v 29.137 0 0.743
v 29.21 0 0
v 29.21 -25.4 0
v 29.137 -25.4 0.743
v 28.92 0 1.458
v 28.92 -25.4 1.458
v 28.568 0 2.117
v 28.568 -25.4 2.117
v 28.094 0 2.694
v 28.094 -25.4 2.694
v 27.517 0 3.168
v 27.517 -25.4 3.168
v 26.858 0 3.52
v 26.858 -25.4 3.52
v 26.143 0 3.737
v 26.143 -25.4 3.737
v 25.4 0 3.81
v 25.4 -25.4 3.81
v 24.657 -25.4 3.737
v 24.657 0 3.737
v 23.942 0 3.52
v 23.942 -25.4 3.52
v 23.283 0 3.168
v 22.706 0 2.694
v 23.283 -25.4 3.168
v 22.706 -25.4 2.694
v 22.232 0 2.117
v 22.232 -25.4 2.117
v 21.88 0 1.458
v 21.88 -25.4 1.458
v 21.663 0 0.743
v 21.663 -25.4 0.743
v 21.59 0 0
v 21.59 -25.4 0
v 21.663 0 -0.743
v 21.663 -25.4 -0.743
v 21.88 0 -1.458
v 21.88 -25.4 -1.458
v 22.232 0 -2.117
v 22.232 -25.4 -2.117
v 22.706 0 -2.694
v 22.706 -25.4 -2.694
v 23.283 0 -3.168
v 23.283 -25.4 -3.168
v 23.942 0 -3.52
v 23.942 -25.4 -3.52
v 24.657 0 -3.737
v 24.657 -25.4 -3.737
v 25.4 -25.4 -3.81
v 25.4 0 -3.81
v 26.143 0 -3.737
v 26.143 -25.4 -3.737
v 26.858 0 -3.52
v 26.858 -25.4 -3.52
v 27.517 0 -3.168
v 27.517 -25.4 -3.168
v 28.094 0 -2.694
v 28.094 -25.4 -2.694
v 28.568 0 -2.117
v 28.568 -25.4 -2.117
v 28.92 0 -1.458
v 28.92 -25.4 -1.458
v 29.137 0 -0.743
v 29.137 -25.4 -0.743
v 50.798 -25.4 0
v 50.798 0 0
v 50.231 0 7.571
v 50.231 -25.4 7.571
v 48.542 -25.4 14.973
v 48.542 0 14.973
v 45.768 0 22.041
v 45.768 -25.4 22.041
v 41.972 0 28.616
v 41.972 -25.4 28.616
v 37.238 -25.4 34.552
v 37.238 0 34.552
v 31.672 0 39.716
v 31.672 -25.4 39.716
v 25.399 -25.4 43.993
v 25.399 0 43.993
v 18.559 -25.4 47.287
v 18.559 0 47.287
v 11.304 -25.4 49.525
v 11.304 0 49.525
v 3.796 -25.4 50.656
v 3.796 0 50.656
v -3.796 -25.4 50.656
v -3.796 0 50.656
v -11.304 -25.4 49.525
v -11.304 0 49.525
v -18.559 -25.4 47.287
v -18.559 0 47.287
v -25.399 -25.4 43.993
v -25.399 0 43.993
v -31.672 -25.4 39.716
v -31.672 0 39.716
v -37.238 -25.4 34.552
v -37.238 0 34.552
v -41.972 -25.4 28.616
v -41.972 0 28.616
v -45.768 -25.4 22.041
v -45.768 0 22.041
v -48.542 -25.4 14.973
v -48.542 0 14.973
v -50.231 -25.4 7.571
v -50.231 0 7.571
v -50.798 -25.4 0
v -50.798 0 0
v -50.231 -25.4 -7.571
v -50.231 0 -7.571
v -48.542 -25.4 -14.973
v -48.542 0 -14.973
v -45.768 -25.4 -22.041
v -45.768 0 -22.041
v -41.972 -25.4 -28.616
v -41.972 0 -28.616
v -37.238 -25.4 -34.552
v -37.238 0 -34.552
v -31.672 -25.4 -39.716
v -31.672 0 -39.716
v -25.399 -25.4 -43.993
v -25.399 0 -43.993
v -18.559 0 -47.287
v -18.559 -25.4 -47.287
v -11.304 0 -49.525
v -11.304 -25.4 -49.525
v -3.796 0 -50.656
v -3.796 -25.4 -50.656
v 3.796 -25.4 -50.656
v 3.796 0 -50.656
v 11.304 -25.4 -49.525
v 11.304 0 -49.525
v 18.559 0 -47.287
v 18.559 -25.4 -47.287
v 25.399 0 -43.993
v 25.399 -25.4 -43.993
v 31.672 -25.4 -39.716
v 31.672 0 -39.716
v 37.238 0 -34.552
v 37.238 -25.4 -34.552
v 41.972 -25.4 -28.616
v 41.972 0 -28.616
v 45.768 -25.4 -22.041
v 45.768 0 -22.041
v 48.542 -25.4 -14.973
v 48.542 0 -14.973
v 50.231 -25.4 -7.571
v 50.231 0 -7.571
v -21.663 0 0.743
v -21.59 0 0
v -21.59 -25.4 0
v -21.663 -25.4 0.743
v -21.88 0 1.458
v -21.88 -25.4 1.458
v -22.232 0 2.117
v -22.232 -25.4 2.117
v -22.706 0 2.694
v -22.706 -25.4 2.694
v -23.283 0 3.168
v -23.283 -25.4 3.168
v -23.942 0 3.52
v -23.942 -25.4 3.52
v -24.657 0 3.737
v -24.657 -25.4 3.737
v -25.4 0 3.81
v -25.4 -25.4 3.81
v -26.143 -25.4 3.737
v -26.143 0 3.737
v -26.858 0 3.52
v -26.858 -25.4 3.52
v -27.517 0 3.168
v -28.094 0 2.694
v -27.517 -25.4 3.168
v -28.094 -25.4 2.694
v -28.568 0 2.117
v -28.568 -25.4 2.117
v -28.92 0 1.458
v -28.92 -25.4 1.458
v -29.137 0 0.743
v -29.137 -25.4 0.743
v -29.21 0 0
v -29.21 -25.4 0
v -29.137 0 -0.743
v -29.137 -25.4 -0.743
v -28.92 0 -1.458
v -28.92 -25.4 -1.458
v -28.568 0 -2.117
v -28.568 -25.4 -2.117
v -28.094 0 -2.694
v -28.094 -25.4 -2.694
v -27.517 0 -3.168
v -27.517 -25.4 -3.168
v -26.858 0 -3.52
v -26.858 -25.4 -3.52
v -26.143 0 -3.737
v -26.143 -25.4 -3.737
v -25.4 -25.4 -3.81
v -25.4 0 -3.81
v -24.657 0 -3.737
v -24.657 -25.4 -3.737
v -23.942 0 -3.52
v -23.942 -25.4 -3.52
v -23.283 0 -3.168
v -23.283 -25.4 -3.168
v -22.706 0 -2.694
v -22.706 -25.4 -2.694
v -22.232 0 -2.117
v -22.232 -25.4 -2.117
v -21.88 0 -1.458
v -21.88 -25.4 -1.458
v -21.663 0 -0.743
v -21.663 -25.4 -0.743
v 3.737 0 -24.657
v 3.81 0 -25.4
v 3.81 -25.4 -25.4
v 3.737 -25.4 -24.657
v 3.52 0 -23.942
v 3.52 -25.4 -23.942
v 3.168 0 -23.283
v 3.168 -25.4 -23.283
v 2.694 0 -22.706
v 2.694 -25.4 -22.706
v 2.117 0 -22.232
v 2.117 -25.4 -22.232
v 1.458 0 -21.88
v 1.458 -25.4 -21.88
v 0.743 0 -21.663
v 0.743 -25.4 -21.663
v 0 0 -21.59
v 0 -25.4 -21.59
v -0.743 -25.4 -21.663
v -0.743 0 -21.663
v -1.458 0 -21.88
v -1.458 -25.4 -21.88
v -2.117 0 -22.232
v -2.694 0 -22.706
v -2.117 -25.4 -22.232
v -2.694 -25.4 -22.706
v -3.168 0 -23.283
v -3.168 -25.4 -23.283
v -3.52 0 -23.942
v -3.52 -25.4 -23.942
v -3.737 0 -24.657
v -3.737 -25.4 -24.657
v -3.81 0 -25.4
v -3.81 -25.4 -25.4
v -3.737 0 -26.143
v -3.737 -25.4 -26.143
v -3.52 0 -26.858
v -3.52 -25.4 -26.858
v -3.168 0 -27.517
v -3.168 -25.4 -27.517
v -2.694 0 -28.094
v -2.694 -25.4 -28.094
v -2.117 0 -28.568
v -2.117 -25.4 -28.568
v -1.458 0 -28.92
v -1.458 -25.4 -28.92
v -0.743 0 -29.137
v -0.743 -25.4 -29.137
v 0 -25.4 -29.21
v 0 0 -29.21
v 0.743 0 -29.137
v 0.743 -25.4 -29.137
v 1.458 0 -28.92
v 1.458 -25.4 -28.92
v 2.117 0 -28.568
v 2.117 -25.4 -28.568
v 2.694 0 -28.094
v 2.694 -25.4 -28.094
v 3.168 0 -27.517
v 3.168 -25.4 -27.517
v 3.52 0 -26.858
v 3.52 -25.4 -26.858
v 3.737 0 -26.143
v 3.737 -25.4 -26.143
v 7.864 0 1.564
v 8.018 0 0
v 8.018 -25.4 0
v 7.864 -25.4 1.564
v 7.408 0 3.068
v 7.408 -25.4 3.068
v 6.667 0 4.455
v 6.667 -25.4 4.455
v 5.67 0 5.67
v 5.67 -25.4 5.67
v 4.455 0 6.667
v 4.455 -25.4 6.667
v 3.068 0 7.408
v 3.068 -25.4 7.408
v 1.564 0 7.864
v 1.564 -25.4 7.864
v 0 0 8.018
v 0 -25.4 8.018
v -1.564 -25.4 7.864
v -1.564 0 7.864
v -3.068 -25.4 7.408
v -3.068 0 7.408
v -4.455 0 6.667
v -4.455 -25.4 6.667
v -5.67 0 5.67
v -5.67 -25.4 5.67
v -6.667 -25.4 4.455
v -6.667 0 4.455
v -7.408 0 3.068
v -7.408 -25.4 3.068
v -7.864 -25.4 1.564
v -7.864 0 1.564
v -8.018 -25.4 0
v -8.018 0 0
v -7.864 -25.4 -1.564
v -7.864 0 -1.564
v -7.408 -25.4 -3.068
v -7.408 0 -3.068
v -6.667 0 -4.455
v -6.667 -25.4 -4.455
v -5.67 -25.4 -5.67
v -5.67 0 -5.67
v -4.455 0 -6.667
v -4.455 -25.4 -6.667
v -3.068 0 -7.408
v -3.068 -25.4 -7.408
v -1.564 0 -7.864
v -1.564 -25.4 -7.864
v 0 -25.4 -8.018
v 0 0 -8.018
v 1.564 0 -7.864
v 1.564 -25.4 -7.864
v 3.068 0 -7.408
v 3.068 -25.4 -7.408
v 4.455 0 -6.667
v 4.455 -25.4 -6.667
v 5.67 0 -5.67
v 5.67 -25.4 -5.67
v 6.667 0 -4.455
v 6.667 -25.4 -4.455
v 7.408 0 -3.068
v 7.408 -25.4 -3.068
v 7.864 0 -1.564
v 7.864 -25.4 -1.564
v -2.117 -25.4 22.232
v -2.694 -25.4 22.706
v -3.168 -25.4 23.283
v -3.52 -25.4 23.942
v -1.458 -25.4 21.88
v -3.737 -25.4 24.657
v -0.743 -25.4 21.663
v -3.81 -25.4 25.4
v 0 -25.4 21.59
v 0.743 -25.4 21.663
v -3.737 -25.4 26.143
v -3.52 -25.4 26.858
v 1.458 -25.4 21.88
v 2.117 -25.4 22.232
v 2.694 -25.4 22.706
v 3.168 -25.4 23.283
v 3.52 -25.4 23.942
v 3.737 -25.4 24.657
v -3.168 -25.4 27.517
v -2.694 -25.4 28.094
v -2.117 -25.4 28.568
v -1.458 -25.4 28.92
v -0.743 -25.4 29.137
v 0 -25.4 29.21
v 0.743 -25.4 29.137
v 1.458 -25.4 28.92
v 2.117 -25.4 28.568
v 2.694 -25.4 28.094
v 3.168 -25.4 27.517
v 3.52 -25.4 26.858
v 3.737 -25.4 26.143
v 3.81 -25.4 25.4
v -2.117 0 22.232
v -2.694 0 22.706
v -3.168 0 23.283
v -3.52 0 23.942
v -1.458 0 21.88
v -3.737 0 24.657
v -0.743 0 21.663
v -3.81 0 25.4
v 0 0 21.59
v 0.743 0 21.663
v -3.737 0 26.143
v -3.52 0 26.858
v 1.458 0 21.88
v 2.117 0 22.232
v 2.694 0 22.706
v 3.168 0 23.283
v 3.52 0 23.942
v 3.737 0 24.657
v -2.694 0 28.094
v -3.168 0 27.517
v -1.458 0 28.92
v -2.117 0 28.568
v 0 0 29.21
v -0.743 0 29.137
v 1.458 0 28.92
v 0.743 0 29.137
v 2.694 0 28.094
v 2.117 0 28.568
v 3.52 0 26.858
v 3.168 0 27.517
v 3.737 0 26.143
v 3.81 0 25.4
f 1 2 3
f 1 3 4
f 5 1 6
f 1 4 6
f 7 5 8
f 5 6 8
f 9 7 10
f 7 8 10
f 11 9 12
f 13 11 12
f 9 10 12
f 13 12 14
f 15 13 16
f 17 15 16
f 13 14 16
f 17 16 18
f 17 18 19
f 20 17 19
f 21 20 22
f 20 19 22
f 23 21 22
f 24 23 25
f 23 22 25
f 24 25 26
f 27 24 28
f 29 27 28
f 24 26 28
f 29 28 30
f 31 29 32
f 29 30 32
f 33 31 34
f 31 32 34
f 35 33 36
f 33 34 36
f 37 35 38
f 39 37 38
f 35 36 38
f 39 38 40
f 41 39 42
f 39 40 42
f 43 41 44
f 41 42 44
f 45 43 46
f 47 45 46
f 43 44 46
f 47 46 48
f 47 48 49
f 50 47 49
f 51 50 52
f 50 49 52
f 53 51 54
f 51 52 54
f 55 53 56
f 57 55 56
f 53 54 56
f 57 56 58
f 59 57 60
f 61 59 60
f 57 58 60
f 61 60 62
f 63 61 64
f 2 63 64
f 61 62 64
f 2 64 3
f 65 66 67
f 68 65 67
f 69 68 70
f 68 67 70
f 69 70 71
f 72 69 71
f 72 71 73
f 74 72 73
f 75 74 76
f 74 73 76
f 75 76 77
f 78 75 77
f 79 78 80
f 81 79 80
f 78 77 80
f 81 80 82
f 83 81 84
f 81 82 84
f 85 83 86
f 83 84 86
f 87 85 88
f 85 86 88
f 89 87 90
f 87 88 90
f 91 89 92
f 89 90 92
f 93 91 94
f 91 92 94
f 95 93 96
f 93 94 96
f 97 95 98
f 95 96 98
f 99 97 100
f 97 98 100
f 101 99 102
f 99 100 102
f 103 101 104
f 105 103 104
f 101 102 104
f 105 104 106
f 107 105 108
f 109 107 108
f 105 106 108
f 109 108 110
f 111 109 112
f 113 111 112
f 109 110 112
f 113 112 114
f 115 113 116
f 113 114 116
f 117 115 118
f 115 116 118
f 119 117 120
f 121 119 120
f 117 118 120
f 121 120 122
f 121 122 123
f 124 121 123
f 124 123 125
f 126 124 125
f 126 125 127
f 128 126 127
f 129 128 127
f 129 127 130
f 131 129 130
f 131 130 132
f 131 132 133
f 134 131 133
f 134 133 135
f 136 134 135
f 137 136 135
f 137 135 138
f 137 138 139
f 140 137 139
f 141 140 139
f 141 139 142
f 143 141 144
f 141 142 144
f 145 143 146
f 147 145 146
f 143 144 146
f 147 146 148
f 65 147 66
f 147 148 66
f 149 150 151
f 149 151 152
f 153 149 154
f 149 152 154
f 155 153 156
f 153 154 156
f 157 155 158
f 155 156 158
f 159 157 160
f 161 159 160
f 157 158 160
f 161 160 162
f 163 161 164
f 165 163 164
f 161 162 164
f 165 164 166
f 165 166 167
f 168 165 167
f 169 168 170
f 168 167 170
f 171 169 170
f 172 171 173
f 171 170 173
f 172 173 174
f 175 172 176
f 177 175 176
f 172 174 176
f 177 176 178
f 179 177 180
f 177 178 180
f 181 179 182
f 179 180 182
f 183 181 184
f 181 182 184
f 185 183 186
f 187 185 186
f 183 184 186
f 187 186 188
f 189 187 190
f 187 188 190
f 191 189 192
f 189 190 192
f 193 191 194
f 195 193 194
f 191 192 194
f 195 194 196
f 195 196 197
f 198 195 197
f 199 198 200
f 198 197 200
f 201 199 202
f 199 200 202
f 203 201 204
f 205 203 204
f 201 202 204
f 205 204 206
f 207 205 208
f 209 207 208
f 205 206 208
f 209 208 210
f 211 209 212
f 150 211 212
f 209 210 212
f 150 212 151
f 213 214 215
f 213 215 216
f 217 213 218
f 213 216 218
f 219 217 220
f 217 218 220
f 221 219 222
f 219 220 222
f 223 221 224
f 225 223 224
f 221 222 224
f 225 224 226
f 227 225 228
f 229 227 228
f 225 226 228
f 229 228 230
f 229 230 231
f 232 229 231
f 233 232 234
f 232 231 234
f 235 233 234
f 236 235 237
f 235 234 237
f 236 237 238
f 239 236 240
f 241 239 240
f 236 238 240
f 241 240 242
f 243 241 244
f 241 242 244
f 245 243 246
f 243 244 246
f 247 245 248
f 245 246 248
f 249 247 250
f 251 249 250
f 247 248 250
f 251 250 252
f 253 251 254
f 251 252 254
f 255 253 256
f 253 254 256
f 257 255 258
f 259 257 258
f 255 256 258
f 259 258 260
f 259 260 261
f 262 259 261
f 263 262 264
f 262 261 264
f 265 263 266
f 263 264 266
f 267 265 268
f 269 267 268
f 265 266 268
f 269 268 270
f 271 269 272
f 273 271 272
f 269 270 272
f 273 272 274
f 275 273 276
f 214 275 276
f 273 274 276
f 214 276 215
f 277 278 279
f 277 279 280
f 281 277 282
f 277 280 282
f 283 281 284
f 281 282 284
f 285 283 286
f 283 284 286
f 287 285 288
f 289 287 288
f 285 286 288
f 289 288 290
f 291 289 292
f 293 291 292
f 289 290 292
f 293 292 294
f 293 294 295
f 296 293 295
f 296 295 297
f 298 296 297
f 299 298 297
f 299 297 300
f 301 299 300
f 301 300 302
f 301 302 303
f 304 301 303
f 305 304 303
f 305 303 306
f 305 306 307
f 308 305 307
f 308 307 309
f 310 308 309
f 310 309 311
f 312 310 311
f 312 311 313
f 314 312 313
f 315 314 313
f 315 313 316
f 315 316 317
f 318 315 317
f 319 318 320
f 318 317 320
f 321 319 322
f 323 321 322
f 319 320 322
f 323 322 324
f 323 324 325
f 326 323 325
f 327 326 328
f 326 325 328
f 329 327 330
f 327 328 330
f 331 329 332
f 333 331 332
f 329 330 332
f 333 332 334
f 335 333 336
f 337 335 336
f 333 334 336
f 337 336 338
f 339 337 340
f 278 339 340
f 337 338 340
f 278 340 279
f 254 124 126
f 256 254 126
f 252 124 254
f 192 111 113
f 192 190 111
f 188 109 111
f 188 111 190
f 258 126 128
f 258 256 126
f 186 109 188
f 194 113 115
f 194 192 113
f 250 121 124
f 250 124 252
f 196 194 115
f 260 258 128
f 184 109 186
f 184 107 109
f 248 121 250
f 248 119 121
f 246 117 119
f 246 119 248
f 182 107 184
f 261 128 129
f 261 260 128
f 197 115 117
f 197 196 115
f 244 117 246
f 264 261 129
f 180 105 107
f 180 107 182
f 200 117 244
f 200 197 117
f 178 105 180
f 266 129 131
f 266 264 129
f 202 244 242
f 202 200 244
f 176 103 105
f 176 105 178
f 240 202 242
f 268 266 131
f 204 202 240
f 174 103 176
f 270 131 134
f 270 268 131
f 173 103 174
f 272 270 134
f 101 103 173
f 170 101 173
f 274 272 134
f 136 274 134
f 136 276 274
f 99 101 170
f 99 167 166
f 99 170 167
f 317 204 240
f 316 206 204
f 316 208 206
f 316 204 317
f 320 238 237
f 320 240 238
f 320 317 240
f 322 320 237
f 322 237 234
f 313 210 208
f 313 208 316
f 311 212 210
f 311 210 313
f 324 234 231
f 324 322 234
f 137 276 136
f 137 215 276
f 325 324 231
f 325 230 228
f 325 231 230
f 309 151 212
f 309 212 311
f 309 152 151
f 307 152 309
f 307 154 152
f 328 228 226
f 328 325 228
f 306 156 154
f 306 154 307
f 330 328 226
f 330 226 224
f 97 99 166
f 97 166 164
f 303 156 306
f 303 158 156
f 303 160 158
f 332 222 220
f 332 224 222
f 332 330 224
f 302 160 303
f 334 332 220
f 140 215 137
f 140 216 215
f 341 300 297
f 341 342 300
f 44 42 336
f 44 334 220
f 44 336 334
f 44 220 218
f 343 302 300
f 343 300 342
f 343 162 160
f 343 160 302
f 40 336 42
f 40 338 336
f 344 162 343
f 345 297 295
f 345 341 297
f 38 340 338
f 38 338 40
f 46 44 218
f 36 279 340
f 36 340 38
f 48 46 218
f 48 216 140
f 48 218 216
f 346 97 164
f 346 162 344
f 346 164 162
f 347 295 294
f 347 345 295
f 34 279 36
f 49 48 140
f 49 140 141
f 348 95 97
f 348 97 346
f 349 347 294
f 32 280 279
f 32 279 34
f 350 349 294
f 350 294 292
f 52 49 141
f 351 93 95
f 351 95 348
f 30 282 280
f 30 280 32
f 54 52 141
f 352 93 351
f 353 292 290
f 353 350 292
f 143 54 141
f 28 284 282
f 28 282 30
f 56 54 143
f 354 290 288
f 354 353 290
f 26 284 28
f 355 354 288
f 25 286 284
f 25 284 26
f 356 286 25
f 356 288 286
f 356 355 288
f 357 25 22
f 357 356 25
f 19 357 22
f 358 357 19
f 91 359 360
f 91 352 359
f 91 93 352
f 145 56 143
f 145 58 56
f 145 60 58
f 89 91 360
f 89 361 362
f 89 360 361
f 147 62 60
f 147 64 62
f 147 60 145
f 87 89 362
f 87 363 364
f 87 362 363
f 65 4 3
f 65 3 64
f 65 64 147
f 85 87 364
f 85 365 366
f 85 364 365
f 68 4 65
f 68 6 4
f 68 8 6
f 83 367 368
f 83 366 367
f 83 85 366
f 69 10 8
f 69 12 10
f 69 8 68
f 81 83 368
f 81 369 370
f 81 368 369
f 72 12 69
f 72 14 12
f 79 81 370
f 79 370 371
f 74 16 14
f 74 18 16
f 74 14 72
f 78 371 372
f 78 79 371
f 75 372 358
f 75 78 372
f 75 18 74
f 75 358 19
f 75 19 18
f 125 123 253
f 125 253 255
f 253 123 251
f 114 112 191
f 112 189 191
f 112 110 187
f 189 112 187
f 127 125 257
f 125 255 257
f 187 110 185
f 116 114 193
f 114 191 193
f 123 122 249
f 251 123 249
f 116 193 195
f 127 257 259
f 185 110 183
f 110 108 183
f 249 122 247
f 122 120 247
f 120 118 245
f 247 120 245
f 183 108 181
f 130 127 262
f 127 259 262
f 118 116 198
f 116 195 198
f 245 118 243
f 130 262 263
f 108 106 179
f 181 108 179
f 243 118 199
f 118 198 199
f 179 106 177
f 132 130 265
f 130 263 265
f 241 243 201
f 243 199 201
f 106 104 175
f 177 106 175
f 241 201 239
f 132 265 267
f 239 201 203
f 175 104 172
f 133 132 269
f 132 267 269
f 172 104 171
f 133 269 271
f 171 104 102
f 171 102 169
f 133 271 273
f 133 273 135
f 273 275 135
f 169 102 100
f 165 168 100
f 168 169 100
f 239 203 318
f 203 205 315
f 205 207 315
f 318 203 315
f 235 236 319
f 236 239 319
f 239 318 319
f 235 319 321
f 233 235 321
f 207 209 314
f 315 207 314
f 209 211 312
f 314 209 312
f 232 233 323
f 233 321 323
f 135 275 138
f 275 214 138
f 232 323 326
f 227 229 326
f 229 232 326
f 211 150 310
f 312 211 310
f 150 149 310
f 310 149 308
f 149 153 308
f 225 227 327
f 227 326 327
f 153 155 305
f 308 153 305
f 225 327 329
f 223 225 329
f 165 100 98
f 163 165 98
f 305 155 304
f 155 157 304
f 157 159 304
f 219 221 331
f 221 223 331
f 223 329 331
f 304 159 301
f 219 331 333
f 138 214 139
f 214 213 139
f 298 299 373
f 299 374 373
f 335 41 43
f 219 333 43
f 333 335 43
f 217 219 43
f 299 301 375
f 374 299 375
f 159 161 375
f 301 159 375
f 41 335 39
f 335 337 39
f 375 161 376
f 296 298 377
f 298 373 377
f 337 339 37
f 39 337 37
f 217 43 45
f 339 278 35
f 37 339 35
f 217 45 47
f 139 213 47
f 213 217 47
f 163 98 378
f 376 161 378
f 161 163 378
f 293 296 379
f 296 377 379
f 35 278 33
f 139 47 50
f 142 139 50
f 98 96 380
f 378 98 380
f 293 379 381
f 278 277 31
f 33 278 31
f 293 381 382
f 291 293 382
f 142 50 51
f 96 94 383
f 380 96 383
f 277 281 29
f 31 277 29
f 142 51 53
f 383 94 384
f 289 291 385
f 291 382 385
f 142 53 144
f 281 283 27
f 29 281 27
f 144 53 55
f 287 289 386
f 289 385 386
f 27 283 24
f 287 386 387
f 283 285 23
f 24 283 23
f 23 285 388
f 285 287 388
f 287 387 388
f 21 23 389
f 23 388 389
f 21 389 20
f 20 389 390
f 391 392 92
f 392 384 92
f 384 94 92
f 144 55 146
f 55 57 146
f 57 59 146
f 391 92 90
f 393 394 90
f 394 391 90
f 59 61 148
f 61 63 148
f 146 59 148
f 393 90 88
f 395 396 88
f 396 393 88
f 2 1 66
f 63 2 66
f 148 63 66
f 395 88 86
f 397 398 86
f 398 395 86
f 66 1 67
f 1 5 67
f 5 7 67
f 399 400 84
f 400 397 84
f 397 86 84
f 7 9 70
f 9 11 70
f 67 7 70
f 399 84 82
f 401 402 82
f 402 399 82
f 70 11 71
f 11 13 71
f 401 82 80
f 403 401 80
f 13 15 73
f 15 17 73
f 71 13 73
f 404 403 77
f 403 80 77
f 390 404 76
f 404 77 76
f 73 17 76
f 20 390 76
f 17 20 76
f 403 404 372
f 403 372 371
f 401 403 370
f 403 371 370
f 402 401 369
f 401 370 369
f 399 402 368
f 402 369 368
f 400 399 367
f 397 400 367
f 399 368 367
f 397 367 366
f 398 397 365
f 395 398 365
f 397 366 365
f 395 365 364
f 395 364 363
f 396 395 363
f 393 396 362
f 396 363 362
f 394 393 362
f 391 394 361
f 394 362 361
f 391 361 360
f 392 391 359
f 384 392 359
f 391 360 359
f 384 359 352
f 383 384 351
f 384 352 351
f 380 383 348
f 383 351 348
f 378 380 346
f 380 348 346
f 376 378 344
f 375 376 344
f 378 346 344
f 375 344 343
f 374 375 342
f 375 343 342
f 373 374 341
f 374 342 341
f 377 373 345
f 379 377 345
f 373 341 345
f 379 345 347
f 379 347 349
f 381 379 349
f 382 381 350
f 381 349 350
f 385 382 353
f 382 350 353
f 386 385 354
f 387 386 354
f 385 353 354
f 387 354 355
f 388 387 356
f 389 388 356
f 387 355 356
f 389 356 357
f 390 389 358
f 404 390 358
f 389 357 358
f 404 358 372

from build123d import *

# Parameters (mm, degrees)
F0_R     = 50.798489
F1_DEPTH = 25.4
F2_R     = 8.018055
F3_DEPTH = 88.392
F4_R     = 3.81
F6_DEPTH = 25.4


with BuildPart() as f1:
    # F0 (on Front) → F1 (new body)
    with BuildSketch(Plane.XZ):
        Circle(F0_R)
    extrude(amount=F1_DEPTH)

    # F2 (on face) → F3 (cut)
    with BuildSketch(Plane.XZ.offset(25.4)):
        Circle(F2_R)
    extrude(amount=-F3_DEPTH, mode=Mode.SUBTRACT)

    # F4 (on face) → F6 (cut)
    with BuildSketch(Plane.XZ.offset(25.4)):
        with Locations((0, 25.4)):
            Circle(F4_R)
        with Locations((-25.4, 0)):
            Circle(F4_R)
        with Locations((0, -25.4)):
            Circle(F4_R)
        with Locations((25.4, 0)):
            Circle(F4_R)
    extrude(amount=-F6_DEPTH, mode=Mode.SUBTRACT)


solid = f1.part
